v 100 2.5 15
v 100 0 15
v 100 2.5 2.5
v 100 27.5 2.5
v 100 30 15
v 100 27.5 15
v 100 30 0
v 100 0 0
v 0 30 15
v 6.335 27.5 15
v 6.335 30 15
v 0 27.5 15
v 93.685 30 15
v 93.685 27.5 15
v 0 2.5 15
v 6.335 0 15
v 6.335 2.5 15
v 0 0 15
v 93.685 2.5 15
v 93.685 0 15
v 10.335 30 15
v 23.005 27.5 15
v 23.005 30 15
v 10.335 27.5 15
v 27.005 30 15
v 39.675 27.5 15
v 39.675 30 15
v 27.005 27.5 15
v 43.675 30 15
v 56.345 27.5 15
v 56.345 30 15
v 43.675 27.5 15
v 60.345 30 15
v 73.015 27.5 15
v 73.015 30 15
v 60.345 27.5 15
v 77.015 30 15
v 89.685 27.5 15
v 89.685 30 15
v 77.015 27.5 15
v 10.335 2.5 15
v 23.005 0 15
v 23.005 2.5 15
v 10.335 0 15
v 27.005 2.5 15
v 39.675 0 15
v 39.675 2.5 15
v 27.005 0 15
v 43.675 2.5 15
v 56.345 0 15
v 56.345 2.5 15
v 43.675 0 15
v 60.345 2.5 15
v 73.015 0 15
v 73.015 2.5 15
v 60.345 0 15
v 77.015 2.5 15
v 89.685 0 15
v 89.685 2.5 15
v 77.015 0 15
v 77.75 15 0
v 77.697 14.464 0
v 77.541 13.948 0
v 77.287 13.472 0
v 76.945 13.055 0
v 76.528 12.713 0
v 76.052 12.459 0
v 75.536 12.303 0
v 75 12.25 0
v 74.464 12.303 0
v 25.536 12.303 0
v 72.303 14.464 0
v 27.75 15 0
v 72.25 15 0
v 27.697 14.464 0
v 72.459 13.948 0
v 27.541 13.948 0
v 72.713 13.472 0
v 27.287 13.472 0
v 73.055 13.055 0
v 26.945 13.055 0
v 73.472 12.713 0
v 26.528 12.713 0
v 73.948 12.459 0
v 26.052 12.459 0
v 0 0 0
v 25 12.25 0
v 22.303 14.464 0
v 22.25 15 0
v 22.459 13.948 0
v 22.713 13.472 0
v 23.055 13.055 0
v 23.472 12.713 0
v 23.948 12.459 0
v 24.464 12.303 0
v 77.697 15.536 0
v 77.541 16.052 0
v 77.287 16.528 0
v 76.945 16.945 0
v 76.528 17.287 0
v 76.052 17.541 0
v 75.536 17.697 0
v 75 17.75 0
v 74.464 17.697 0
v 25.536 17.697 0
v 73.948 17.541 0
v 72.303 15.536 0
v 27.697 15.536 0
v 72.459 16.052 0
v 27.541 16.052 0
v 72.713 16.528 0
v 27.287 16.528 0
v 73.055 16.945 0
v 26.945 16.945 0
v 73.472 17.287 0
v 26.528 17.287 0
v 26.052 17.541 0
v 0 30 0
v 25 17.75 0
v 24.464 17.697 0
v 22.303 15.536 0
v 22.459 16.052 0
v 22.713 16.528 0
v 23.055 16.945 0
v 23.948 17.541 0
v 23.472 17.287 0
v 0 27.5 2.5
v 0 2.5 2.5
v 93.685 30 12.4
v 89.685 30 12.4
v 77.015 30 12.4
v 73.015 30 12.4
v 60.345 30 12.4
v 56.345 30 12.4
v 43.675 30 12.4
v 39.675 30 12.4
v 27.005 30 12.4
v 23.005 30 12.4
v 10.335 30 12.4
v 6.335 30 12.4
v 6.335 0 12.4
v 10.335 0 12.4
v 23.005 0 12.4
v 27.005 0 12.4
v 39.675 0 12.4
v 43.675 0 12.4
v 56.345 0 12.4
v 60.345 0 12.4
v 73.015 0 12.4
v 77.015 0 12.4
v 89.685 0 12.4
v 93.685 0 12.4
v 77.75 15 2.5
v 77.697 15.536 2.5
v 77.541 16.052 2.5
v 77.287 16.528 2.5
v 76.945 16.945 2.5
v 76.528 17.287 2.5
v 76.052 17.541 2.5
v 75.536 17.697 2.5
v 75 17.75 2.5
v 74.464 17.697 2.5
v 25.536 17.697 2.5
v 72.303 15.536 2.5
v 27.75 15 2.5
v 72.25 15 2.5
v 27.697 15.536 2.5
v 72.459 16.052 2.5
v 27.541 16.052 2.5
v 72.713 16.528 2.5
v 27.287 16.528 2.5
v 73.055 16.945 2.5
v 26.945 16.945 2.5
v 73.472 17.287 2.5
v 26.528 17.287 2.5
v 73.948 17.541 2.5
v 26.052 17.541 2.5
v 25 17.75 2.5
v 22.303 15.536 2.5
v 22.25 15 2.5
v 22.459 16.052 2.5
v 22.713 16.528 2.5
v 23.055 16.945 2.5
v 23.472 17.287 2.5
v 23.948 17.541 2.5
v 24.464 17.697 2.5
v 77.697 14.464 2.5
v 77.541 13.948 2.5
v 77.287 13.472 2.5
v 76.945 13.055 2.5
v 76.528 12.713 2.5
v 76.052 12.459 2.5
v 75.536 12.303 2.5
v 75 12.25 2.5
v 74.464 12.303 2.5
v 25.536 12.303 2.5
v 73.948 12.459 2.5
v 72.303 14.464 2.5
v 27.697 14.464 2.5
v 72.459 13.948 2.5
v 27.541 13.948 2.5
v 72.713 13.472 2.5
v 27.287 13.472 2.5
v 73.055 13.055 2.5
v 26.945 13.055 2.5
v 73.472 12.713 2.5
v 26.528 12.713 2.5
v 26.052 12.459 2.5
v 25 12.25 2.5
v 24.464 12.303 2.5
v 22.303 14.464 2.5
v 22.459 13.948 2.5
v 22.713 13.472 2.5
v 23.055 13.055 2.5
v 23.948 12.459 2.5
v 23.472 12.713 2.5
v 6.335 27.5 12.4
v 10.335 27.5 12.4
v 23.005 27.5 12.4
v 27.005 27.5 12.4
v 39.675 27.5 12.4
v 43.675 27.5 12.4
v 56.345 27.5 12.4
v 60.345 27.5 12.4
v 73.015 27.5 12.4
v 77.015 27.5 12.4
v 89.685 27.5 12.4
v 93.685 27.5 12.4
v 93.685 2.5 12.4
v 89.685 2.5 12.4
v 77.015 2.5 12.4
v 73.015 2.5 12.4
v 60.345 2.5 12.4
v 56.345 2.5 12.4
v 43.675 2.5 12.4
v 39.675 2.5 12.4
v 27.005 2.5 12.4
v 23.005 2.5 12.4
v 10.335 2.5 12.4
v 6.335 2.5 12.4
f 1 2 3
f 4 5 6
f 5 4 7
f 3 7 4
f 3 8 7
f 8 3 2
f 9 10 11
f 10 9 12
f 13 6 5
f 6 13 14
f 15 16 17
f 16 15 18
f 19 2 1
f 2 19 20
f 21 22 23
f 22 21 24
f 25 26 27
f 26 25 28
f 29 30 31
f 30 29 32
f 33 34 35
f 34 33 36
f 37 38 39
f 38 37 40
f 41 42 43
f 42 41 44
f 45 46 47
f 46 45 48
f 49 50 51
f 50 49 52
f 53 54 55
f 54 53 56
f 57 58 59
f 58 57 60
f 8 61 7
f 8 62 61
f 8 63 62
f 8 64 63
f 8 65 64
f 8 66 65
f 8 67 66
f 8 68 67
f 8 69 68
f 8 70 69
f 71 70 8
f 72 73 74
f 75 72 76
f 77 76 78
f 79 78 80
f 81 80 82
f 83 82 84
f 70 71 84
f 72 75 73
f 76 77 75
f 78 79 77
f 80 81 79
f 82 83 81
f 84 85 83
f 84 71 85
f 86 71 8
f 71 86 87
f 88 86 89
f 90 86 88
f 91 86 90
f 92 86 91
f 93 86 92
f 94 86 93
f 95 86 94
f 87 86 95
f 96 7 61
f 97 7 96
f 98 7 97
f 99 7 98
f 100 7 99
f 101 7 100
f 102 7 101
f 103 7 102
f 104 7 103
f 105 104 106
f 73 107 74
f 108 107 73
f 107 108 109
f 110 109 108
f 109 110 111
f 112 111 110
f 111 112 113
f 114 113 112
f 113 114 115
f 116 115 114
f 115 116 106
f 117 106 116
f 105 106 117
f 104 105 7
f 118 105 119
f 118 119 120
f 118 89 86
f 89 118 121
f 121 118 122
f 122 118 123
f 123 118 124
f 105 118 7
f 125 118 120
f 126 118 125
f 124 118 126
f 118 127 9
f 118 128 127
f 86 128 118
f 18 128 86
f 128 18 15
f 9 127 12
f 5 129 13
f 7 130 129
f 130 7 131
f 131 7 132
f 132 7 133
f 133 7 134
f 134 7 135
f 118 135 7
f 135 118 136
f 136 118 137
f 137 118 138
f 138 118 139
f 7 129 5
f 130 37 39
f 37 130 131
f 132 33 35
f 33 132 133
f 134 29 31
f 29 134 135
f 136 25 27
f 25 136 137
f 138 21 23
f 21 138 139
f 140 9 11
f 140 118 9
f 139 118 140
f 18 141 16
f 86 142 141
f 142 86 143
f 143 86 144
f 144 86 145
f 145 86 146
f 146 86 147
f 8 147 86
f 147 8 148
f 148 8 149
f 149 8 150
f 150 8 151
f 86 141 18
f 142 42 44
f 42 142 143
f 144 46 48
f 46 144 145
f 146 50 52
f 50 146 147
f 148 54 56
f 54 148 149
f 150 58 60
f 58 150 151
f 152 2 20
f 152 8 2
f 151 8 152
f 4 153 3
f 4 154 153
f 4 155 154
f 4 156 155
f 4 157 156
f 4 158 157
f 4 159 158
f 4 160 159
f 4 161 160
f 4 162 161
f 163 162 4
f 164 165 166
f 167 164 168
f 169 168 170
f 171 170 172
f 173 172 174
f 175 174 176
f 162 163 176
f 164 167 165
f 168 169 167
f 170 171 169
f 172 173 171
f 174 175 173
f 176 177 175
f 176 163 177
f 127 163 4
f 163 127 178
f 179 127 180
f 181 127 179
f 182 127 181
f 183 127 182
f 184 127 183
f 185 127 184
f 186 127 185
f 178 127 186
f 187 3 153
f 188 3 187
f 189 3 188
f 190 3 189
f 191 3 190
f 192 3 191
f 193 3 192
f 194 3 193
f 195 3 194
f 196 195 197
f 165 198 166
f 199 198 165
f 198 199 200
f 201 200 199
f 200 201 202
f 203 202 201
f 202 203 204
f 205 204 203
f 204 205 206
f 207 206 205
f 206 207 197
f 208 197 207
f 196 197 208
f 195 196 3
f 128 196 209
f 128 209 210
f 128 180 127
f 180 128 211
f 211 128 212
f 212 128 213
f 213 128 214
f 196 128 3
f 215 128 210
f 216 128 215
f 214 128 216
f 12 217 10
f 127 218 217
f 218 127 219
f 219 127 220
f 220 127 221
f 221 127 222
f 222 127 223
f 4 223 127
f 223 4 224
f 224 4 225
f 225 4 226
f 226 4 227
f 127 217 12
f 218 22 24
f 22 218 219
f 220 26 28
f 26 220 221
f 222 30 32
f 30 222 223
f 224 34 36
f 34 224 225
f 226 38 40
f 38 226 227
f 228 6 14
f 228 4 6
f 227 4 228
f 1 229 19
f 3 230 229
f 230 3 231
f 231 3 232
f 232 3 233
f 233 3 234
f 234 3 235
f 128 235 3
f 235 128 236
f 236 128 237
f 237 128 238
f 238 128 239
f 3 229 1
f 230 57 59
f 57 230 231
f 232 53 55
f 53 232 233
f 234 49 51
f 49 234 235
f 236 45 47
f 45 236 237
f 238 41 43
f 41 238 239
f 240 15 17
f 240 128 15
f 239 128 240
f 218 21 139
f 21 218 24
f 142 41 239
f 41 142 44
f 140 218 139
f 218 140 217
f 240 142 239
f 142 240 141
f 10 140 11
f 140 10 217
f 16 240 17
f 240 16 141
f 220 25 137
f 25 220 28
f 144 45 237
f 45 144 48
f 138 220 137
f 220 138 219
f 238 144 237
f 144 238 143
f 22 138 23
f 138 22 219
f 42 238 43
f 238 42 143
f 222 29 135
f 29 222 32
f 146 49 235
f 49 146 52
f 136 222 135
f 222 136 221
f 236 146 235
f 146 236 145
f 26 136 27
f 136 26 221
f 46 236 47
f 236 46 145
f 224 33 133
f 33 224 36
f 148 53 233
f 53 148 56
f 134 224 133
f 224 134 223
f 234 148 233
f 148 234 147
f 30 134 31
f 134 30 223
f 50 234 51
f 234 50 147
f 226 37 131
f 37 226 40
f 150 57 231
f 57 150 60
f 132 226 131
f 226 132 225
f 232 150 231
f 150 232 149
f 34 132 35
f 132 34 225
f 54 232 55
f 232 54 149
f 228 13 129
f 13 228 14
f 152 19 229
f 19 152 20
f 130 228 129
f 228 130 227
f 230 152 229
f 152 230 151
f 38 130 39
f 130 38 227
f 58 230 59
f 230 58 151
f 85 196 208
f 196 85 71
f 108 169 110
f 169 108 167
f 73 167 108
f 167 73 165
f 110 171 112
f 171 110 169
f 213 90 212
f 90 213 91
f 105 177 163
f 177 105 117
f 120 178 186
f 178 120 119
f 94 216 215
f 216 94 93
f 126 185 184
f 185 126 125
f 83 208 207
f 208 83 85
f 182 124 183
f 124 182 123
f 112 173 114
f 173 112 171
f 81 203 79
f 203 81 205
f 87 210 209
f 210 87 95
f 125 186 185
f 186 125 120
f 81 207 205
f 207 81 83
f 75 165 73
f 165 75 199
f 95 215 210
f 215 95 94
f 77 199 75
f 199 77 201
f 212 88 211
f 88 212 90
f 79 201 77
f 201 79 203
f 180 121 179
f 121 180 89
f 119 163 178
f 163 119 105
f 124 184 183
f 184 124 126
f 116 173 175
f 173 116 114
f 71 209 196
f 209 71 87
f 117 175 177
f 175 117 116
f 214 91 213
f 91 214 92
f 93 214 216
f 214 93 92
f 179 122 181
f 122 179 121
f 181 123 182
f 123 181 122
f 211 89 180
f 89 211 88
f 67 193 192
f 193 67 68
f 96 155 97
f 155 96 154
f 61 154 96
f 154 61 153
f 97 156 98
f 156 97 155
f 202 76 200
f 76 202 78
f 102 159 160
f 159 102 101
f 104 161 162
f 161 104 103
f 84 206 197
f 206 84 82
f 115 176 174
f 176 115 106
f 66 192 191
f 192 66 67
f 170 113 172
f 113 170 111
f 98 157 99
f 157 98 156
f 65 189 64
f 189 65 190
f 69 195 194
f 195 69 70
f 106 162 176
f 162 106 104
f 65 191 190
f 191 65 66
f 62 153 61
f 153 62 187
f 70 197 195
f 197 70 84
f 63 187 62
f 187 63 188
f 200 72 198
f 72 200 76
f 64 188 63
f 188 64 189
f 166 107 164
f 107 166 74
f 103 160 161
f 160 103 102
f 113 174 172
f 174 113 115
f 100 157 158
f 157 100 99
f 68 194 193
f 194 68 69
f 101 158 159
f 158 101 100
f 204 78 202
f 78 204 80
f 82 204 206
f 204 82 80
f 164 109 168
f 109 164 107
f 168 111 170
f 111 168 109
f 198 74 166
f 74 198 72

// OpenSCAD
$fn = 32;

// ----------------------------------------------------------------------
// Cable duct: 100 x 30 x 15 mm, 6 fingers
// ----------------------------------------------------------------------

// --- parameters (mm) ---
duct_len = 100;           // duct length, X
duct_w = 30;              // duct width, Y
duct_h = 15;              // duct height, Z
wall_t = 2.5;             // side wall thickness
floor_t = 2.5;            // floor thickness
slot_w = 4;               // finger slot width
slot_h = 9.9;             // finger slot height
fingers = 6;              // number of finger slots per side
pitch = 16.67;            // finger pitch
hole_d = 5.5;             // floor mounting hole
hole_n = 2;               // mounting holes in the floor

module shell() {
  difference() {
    cube([duct_len, duct_w, duct_h]);
    /* open top channel */
    translate([-wall_t - 1, wall_t, floor_t])
      cube([duct_len + 2 * wall_t + 2, duct_w - 2 * wall_t, duct_h + 1]);
  }
}

difference() {
  union() {
    shell();
  }
  /* finger slots cut through both side walls */
  for (i = [0 : fingers - 1]) translate([pitch / 2 + i * pitch - slot_w / 2, -1, floor_t + slot_h]) cube([slot_w, duct_w + 2, duct_h]);
  for (i = [0 : hole_n - 1]) translate([(duct_len / hole_n) * (i + 0.5), duct_w / 2, -1]) cylinder(h = floor_t + 2, d = hole_d);
}
